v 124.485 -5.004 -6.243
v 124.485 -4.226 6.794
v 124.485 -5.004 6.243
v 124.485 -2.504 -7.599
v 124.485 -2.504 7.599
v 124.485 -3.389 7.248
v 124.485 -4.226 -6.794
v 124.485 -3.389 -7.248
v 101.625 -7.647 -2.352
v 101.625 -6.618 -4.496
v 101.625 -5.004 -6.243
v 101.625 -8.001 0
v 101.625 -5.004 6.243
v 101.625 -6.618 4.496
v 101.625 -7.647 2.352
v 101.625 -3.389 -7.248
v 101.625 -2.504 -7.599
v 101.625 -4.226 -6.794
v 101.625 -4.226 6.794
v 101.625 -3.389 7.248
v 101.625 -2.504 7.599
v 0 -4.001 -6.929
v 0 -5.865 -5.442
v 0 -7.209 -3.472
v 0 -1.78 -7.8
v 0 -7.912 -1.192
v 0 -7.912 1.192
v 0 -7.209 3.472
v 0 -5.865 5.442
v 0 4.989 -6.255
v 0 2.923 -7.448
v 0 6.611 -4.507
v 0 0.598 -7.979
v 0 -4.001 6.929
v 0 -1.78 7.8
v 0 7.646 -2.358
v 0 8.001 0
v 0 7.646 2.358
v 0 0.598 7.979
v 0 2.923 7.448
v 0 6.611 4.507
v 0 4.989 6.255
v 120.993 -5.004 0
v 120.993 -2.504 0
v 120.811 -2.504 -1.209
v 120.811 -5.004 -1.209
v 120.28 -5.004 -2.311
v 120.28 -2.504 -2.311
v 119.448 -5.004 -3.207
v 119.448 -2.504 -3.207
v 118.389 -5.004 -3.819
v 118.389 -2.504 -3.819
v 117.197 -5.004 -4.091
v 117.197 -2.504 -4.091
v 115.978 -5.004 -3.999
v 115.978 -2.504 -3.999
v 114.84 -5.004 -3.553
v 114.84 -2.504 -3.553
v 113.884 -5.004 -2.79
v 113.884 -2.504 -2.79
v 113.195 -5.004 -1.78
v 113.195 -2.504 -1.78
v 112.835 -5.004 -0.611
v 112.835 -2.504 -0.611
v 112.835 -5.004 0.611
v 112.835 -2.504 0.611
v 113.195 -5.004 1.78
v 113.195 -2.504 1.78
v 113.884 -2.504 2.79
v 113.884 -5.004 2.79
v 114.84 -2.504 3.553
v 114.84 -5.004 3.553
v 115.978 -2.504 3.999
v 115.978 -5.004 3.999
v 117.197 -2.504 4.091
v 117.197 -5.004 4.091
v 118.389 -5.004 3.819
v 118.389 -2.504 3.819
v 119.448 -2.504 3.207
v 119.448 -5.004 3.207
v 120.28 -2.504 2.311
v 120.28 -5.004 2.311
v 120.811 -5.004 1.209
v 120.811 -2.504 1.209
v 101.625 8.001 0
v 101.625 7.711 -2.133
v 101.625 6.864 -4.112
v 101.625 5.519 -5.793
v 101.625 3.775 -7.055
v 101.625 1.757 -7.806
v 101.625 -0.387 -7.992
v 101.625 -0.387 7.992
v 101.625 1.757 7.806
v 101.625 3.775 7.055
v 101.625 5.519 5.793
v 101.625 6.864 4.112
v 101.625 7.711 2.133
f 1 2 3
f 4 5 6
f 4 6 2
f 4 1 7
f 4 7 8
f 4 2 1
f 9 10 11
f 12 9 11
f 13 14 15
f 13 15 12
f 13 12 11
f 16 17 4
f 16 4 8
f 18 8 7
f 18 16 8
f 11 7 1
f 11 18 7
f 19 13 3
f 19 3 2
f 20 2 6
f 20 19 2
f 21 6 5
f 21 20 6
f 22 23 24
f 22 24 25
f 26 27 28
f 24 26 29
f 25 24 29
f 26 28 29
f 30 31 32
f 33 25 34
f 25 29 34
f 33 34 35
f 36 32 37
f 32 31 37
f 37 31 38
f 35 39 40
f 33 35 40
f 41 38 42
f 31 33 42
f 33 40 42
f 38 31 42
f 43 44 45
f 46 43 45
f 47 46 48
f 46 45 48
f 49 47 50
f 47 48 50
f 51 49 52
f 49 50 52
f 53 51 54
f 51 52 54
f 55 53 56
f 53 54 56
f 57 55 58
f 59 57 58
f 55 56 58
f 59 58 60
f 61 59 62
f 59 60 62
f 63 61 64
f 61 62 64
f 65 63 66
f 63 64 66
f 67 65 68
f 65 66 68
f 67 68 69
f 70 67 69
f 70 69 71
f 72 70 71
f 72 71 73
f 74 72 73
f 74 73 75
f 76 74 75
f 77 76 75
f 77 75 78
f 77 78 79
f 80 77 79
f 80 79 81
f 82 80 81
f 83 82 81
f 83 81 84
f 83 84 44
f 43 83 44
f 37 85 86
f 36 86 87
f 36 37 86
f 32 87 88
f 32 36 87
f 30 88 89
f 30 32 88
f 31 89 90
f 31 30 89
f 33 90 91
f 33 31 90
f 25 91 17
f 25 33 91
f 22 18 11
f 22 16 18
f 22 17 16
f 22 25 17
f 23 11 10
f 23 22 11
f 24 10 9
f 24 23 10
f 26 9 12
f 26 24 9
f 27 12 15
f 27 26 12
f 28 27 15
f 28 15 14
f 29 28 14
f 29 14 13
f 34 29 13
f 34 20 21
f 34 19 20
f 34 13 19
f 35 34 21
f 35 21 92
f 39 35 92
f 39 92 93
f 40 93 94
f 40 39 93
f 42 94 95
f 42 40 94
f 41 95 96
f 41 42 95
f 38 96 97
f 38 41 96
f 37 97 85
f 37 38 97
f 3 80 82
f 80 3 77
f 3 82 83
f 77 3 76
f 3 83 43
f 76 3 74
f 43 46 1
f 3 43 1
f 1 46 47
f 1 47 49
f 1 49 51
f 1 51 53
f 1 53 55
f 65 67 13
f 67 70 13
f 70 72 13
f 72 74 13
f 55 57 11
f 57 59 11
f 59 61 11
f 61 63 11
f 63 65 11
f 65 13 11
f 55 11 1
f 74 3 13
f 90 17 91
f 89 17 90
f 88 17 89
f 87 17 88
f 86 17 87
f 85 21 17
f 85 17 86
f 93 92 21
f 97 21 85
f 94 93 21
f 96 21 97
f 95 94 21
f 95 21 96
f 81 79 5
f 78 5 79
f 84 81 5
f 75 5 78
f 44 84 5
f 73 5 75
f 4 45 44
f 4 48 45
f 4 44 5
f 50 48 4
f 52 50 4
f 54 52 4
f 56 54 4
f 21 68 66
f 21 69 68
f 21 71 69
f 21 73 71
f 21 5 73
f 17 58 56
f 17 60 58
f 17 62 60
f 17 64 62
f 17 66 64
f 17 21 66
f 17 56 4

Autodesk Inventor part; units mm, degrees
ref_plane "YZ Plane" through (0, 0, 0) normal (1, 0, 0) x (0, 1, 0)
ref_plane "XZ Plane" through (0, 0, 0) normal (0, 1, 0) x (-1, 0, 0)
ref_plane "XY Plane" through (0, 0, 0) normal (0, 0, 1) x (1, 0, 0)
sketch "Sketch1" plane through (0, 0, 0) normal (1, 0, 0) x (0, 1, 0)
  circle A0 centre (0, 0) radius 8.001
  dimension "d0" = 16.002
extrude "Extrusion1" add sketch "Sketch1" along normal blind 101.6254
sketch "Sketch2" plane through (101.6254, 0, 0) normal (1, 0, 0) x (0, 0, -1)
  line L0 (-6.2432, -5.0038) -> (6.2432, -5.0038)
  line L1 (-7.5991, -2.5038) -> (7.5991, -2.5038)
  arc A0 (6.2432, -5.0038) -> (7.5991, -2.5038) centre (0, 0) ccw
  arc A1 (-7.5991, -2.5038) -> (-6.2432, -5.0038) centre (0, 0) ccw
  circle A2 centre (0, 0) radius 8.001 projected
  point P0 (7.0332, -3.8145)
  point P1 (-7.0332, -3.8145)
  dimension "d3" = 5.0038
  dimension "d4" = 2.5
extrude "Extrusion2" add sketch "Sketch2" along normal blind 22.86 contours A1 L1 A0 L0
sketch "Sketch3" plane through (101.6254, -2.5038, 7.5991) normal (0, 1, 0) x (1, 0, 0)
  circle A0 centre (15.2654, 7.5991) radius 4.1021
  line L0 (0, 15.1983) -> (22.86, 15.1983) projected
  line L1 (0, 0) -> (22.86, 0) projected
  line L2 (0, 0) -> (0, 15.1983) projected
  point P0 (-101.6254, 7.5991)
  dimension "d8" = 8.2042
  dimension "d9" = 7.5991
  dimension "d10" = 15.1983
  dimension "d13" = 15.2654
extrude "Extrusion3" cut sketch "Sketch3" against normal blind 15.0114
equation "\"d9\" = 0.5 * d10"
properties part number "Ring Connector model 5"
